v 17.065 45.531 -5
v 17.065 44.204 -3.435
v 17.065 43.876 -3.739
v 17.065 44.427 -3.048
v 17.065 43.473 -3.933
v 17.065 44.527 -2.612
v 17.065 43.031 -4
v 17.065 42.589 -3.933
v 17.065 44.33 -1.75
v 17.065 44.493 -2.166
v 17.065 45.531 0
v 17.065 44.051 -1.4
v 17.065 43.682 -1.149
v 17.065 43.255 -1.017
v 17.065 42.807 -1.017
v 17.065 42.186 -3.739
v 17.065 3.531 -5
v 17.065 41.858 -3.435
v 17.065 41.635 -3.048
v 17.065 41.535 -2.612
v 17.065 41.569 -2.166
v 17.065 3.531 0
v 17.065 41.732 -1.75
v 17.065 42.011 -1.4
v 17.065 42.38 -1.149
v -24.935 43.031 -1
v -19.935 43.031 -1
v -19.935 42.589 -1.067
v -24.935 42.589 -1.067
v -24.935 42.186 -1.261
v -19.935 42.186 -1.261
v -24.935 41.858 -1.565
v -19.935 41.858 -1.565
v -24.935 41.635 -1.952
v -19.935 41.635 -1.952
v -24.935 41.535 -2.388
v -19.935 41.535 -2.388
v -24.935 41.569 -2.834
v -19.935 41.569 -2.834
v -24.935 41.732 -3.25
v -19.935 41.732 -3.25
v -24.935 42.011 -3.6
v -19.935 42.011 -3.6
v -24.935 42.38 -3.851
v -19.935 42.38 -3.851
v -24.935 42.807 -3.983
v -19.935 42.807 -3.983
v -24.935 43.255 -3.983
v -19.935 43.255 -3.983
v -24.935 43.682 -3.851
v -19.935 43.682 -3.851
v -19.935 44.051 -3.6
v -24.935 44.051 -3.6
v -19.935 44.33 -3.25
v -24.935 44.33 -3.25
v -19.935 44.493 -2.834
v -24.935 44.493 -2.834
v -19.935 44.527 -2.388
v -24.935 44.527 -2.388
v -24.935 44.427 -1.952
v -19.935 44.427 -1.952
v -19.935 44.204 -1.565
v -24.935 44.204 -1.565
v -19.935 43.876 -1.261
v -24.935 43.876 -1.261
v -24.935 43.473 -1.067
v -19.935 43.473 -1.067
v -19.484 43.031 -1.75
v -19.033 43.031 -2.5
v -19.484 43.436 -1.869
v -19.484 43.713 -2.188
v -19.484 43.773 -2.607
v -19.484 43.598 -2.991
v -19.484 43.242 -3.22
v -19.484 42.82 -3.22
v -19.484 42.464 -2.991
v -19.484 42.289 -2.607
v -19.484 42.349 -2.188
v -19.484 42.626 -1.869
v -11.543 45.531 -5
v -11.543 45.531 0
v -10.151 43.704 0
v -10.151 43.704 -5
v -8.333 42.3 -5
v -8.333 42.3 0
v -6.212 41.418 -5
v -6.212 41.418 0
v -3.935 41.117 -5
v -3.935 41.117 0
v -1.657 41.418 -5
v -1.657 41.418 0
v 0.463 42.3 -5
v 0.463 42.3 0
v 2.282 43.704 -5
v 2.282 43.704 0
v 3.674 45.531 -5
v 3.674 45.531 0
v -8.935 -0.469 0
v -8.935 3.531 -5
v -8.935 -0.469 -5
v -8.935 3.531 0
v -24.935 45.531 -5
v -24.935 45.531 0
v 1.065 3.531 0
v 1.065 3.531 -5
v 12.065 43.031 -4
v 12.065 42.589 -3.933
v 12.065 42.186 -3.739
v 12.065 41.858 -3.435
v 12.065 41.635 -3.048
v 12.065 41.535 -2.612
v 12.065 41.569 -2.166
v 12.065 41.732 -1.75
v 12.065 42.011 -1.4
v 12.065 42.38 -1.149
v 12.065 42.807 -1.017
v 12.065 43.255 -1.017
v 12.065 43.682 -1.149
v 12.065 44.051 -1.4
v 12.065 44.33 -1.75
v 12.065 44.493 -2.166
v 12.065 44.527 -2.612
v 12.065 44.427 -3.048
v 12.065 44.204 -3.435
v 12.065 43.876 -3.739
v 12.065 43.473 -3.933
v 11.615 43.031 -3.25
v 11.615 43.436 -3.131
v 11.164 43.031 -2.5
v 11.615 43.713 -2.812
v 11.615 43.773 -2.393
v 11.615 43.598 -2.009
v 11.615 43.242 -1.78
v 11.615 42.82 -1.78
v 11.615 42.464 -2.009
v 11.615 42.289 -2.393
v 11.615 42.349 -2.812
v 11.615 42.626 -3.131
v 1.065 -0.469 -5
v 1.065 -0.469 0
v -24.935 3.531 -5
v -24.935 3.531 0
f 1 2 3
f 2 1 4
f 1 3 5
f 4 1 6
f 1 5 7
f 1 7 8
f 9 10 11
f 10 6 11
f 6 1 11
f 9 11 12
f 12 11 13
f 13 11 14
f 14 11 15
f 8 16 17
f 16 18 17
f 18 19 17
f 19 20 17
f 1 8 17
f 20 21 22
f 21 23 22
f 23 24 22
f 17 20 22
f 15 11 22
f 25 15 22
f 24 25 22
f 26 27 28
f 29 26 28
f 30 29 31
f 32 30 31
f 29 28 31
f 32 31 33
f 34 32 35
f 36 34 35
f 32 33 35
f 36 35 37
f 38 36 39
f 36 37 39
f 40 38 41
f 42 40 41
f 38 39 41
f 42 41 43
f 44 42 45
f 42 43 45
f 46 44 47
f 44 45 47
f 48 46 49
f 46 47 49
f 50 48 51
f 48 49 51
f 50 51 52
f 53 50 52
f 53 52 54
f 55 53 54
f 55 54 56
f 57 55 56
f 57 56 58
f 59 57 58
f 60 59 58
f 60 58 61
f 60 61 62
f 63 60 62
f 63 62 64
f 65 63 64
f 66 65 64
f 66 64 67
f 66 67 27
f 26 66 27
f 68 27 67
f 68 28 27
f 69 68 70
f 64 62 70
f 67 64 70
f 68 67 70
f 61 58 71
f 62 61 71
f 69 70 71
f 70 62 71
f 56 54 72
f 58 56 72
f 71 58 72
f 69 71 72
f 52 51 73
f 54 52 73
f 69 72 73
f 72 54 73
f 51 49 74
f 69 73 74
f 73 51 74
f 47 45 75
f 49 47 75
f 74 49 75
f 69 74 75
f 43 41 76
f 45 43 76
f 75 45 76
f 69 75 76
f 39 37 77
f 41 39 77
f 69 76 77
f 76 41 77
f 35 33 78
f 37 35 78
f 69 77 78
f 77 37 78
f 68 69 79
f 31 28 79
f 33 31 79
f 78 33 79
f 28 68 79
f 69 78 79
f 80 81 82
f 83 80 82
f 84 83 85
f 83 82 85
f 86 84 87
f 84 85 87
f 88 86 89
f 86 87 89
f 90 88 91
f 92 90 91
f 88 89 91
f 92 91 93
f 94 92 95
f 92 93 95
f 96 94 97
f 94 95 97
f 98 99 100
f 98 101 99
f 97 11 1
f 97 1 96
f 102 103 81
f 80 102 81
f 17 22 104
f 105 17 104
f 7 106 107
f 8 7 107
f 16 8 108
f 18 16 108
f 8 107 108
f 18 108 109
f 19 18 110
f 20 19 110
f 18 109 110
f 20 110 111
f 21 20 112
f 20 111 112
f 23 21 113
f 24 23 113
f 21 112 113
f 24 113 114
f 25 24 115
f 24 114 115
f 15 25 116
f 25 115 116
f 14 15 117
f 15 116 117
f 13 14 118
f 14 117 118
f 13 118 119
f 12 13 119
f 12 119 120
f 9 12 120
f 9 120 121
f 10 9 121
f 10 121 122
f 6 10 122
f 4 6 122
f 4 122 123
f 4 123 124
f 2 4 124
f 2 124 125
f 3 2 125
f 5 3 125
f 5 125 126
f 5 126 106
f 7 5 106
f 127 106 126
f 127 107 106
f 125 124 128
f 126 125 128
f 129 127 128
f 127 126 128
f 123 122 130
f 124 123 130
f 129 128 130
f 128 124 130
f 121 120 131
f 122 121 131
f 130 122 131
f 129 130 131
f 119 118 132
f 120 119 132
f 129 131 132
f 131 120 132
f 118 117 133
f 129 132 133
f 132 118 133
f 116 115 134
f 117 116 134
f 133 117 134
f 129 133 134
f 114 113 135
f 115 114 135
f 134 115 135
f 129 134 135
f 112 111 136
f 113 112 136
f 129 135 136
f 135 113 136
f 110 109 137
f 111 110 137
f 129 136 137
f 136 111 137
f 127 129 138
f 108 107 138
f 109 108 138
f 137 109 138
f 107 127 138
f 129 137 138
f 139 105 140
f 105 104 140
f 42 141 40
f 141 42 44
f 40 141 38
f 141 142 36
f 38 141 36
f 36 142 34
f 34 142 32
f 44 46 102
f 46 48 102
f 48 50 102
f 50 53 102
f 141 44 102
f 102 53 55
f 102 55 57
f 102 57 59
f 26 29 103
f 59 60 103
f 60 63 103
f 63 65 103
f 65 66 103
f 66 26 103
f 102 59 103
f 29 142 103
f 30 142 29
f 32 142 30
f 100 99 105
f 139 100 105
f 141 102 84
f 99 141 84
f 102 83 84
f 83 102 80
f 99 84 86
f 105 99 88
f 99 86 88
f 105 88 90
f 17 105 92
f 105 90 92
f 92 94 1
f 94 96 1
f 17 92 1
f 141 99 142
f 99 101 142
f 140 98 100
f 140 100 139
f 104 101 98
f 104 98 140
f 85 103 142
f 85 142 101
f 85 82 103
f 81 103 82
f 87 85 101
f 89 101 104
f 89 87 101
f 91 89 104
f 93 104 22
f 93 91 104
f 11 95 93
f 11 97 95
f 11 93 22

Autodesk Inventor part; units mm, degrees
ref_plane "YZ Plane" through (0, 0, 0) normal (1, 0, 0) x (0, 1, 0)
ref_plane "XZ Plane" through (0, 0, 0) normal (0, 1, 0) x (-1, 0, 0)
ref_plane "XY Plane" through (0, 0, 0) normal (0, 0, 1) x (1, 0, 0)
sketch "Sketch1" plane through (0, 0, 0) normal (0, 0, 1) x (1, 0, 0)
  line L0 (-8.9346, 3.531) -> (-24.9346, 3.531)
  line L1 (-24.9346, 3.531) -> (-24.9346, 45.531)
  line L2 (17.0654, 45.531) -> (17.0654, 3.531)
  line L3 (17.0654, 3.531) -> (1.0654, 3.531)
  line L4 (-8.9346, -0.469) -> (1.0654, -0.469)
  line L5 (-8.9346, 3.531) -> (-8.9346, -0.469)
  line L6 (1.0654, 3.531) -> (1.0654, -0.469)
  line L7 (17.0654, 45.531) -> (3.6736, 45.531)
  line L8 (-24.9346, 45.531) -> (-11.5428, 45.531)
  arc A0 (-11.5428, 45.531) -> (3.6736, 45.531) centre (-3.9346, 49.8809) ccw
  point P0 (0, 0)
extrude "Extrusion4" add sketch "Sketch1" against normal blind 5
sketch "Sketch2" plane through (17.0654, 3.531, 0) normal (1, 0, 0) x (0, 0, -1)
  line L0 (0, 42) -> (5, 42) projected
  line L1 (0, 42) -> (0, 39.5)
  line L2 (0, 37.5859) -> (0, 42) projected
  line L3 (0, 39.5) -> (5, 39.5)
  line L4 (5, 42) -> (5, 37.5859) projected
  circle A0 centre (2.5, 39.5) radius 1.5
  point P0 (0, -3.531)
hole "Hole1" at (17.0654, 43.031, -2.5) direction (-1, 0, 0) diameter 3 depth 5 tip angle 118
sketch "Sketch3" plane through (-24.9346, 3.531, 0) normal (-1, 0, 0) x (0, 0, 1)
  circle A0 centre (-2.5, 39.5) radius 1.5 projected
  circle A1 centre (-2.5, 39.5) radius 1.5
  point P0 (0, -3.531)
hole "Hole2" at (-24.9346, 43.031, -2.5) direction (1, 0, 0) diameter 3 depth 5 tip angle 118
properties part number "suport continuare seringa" material "Gold"
